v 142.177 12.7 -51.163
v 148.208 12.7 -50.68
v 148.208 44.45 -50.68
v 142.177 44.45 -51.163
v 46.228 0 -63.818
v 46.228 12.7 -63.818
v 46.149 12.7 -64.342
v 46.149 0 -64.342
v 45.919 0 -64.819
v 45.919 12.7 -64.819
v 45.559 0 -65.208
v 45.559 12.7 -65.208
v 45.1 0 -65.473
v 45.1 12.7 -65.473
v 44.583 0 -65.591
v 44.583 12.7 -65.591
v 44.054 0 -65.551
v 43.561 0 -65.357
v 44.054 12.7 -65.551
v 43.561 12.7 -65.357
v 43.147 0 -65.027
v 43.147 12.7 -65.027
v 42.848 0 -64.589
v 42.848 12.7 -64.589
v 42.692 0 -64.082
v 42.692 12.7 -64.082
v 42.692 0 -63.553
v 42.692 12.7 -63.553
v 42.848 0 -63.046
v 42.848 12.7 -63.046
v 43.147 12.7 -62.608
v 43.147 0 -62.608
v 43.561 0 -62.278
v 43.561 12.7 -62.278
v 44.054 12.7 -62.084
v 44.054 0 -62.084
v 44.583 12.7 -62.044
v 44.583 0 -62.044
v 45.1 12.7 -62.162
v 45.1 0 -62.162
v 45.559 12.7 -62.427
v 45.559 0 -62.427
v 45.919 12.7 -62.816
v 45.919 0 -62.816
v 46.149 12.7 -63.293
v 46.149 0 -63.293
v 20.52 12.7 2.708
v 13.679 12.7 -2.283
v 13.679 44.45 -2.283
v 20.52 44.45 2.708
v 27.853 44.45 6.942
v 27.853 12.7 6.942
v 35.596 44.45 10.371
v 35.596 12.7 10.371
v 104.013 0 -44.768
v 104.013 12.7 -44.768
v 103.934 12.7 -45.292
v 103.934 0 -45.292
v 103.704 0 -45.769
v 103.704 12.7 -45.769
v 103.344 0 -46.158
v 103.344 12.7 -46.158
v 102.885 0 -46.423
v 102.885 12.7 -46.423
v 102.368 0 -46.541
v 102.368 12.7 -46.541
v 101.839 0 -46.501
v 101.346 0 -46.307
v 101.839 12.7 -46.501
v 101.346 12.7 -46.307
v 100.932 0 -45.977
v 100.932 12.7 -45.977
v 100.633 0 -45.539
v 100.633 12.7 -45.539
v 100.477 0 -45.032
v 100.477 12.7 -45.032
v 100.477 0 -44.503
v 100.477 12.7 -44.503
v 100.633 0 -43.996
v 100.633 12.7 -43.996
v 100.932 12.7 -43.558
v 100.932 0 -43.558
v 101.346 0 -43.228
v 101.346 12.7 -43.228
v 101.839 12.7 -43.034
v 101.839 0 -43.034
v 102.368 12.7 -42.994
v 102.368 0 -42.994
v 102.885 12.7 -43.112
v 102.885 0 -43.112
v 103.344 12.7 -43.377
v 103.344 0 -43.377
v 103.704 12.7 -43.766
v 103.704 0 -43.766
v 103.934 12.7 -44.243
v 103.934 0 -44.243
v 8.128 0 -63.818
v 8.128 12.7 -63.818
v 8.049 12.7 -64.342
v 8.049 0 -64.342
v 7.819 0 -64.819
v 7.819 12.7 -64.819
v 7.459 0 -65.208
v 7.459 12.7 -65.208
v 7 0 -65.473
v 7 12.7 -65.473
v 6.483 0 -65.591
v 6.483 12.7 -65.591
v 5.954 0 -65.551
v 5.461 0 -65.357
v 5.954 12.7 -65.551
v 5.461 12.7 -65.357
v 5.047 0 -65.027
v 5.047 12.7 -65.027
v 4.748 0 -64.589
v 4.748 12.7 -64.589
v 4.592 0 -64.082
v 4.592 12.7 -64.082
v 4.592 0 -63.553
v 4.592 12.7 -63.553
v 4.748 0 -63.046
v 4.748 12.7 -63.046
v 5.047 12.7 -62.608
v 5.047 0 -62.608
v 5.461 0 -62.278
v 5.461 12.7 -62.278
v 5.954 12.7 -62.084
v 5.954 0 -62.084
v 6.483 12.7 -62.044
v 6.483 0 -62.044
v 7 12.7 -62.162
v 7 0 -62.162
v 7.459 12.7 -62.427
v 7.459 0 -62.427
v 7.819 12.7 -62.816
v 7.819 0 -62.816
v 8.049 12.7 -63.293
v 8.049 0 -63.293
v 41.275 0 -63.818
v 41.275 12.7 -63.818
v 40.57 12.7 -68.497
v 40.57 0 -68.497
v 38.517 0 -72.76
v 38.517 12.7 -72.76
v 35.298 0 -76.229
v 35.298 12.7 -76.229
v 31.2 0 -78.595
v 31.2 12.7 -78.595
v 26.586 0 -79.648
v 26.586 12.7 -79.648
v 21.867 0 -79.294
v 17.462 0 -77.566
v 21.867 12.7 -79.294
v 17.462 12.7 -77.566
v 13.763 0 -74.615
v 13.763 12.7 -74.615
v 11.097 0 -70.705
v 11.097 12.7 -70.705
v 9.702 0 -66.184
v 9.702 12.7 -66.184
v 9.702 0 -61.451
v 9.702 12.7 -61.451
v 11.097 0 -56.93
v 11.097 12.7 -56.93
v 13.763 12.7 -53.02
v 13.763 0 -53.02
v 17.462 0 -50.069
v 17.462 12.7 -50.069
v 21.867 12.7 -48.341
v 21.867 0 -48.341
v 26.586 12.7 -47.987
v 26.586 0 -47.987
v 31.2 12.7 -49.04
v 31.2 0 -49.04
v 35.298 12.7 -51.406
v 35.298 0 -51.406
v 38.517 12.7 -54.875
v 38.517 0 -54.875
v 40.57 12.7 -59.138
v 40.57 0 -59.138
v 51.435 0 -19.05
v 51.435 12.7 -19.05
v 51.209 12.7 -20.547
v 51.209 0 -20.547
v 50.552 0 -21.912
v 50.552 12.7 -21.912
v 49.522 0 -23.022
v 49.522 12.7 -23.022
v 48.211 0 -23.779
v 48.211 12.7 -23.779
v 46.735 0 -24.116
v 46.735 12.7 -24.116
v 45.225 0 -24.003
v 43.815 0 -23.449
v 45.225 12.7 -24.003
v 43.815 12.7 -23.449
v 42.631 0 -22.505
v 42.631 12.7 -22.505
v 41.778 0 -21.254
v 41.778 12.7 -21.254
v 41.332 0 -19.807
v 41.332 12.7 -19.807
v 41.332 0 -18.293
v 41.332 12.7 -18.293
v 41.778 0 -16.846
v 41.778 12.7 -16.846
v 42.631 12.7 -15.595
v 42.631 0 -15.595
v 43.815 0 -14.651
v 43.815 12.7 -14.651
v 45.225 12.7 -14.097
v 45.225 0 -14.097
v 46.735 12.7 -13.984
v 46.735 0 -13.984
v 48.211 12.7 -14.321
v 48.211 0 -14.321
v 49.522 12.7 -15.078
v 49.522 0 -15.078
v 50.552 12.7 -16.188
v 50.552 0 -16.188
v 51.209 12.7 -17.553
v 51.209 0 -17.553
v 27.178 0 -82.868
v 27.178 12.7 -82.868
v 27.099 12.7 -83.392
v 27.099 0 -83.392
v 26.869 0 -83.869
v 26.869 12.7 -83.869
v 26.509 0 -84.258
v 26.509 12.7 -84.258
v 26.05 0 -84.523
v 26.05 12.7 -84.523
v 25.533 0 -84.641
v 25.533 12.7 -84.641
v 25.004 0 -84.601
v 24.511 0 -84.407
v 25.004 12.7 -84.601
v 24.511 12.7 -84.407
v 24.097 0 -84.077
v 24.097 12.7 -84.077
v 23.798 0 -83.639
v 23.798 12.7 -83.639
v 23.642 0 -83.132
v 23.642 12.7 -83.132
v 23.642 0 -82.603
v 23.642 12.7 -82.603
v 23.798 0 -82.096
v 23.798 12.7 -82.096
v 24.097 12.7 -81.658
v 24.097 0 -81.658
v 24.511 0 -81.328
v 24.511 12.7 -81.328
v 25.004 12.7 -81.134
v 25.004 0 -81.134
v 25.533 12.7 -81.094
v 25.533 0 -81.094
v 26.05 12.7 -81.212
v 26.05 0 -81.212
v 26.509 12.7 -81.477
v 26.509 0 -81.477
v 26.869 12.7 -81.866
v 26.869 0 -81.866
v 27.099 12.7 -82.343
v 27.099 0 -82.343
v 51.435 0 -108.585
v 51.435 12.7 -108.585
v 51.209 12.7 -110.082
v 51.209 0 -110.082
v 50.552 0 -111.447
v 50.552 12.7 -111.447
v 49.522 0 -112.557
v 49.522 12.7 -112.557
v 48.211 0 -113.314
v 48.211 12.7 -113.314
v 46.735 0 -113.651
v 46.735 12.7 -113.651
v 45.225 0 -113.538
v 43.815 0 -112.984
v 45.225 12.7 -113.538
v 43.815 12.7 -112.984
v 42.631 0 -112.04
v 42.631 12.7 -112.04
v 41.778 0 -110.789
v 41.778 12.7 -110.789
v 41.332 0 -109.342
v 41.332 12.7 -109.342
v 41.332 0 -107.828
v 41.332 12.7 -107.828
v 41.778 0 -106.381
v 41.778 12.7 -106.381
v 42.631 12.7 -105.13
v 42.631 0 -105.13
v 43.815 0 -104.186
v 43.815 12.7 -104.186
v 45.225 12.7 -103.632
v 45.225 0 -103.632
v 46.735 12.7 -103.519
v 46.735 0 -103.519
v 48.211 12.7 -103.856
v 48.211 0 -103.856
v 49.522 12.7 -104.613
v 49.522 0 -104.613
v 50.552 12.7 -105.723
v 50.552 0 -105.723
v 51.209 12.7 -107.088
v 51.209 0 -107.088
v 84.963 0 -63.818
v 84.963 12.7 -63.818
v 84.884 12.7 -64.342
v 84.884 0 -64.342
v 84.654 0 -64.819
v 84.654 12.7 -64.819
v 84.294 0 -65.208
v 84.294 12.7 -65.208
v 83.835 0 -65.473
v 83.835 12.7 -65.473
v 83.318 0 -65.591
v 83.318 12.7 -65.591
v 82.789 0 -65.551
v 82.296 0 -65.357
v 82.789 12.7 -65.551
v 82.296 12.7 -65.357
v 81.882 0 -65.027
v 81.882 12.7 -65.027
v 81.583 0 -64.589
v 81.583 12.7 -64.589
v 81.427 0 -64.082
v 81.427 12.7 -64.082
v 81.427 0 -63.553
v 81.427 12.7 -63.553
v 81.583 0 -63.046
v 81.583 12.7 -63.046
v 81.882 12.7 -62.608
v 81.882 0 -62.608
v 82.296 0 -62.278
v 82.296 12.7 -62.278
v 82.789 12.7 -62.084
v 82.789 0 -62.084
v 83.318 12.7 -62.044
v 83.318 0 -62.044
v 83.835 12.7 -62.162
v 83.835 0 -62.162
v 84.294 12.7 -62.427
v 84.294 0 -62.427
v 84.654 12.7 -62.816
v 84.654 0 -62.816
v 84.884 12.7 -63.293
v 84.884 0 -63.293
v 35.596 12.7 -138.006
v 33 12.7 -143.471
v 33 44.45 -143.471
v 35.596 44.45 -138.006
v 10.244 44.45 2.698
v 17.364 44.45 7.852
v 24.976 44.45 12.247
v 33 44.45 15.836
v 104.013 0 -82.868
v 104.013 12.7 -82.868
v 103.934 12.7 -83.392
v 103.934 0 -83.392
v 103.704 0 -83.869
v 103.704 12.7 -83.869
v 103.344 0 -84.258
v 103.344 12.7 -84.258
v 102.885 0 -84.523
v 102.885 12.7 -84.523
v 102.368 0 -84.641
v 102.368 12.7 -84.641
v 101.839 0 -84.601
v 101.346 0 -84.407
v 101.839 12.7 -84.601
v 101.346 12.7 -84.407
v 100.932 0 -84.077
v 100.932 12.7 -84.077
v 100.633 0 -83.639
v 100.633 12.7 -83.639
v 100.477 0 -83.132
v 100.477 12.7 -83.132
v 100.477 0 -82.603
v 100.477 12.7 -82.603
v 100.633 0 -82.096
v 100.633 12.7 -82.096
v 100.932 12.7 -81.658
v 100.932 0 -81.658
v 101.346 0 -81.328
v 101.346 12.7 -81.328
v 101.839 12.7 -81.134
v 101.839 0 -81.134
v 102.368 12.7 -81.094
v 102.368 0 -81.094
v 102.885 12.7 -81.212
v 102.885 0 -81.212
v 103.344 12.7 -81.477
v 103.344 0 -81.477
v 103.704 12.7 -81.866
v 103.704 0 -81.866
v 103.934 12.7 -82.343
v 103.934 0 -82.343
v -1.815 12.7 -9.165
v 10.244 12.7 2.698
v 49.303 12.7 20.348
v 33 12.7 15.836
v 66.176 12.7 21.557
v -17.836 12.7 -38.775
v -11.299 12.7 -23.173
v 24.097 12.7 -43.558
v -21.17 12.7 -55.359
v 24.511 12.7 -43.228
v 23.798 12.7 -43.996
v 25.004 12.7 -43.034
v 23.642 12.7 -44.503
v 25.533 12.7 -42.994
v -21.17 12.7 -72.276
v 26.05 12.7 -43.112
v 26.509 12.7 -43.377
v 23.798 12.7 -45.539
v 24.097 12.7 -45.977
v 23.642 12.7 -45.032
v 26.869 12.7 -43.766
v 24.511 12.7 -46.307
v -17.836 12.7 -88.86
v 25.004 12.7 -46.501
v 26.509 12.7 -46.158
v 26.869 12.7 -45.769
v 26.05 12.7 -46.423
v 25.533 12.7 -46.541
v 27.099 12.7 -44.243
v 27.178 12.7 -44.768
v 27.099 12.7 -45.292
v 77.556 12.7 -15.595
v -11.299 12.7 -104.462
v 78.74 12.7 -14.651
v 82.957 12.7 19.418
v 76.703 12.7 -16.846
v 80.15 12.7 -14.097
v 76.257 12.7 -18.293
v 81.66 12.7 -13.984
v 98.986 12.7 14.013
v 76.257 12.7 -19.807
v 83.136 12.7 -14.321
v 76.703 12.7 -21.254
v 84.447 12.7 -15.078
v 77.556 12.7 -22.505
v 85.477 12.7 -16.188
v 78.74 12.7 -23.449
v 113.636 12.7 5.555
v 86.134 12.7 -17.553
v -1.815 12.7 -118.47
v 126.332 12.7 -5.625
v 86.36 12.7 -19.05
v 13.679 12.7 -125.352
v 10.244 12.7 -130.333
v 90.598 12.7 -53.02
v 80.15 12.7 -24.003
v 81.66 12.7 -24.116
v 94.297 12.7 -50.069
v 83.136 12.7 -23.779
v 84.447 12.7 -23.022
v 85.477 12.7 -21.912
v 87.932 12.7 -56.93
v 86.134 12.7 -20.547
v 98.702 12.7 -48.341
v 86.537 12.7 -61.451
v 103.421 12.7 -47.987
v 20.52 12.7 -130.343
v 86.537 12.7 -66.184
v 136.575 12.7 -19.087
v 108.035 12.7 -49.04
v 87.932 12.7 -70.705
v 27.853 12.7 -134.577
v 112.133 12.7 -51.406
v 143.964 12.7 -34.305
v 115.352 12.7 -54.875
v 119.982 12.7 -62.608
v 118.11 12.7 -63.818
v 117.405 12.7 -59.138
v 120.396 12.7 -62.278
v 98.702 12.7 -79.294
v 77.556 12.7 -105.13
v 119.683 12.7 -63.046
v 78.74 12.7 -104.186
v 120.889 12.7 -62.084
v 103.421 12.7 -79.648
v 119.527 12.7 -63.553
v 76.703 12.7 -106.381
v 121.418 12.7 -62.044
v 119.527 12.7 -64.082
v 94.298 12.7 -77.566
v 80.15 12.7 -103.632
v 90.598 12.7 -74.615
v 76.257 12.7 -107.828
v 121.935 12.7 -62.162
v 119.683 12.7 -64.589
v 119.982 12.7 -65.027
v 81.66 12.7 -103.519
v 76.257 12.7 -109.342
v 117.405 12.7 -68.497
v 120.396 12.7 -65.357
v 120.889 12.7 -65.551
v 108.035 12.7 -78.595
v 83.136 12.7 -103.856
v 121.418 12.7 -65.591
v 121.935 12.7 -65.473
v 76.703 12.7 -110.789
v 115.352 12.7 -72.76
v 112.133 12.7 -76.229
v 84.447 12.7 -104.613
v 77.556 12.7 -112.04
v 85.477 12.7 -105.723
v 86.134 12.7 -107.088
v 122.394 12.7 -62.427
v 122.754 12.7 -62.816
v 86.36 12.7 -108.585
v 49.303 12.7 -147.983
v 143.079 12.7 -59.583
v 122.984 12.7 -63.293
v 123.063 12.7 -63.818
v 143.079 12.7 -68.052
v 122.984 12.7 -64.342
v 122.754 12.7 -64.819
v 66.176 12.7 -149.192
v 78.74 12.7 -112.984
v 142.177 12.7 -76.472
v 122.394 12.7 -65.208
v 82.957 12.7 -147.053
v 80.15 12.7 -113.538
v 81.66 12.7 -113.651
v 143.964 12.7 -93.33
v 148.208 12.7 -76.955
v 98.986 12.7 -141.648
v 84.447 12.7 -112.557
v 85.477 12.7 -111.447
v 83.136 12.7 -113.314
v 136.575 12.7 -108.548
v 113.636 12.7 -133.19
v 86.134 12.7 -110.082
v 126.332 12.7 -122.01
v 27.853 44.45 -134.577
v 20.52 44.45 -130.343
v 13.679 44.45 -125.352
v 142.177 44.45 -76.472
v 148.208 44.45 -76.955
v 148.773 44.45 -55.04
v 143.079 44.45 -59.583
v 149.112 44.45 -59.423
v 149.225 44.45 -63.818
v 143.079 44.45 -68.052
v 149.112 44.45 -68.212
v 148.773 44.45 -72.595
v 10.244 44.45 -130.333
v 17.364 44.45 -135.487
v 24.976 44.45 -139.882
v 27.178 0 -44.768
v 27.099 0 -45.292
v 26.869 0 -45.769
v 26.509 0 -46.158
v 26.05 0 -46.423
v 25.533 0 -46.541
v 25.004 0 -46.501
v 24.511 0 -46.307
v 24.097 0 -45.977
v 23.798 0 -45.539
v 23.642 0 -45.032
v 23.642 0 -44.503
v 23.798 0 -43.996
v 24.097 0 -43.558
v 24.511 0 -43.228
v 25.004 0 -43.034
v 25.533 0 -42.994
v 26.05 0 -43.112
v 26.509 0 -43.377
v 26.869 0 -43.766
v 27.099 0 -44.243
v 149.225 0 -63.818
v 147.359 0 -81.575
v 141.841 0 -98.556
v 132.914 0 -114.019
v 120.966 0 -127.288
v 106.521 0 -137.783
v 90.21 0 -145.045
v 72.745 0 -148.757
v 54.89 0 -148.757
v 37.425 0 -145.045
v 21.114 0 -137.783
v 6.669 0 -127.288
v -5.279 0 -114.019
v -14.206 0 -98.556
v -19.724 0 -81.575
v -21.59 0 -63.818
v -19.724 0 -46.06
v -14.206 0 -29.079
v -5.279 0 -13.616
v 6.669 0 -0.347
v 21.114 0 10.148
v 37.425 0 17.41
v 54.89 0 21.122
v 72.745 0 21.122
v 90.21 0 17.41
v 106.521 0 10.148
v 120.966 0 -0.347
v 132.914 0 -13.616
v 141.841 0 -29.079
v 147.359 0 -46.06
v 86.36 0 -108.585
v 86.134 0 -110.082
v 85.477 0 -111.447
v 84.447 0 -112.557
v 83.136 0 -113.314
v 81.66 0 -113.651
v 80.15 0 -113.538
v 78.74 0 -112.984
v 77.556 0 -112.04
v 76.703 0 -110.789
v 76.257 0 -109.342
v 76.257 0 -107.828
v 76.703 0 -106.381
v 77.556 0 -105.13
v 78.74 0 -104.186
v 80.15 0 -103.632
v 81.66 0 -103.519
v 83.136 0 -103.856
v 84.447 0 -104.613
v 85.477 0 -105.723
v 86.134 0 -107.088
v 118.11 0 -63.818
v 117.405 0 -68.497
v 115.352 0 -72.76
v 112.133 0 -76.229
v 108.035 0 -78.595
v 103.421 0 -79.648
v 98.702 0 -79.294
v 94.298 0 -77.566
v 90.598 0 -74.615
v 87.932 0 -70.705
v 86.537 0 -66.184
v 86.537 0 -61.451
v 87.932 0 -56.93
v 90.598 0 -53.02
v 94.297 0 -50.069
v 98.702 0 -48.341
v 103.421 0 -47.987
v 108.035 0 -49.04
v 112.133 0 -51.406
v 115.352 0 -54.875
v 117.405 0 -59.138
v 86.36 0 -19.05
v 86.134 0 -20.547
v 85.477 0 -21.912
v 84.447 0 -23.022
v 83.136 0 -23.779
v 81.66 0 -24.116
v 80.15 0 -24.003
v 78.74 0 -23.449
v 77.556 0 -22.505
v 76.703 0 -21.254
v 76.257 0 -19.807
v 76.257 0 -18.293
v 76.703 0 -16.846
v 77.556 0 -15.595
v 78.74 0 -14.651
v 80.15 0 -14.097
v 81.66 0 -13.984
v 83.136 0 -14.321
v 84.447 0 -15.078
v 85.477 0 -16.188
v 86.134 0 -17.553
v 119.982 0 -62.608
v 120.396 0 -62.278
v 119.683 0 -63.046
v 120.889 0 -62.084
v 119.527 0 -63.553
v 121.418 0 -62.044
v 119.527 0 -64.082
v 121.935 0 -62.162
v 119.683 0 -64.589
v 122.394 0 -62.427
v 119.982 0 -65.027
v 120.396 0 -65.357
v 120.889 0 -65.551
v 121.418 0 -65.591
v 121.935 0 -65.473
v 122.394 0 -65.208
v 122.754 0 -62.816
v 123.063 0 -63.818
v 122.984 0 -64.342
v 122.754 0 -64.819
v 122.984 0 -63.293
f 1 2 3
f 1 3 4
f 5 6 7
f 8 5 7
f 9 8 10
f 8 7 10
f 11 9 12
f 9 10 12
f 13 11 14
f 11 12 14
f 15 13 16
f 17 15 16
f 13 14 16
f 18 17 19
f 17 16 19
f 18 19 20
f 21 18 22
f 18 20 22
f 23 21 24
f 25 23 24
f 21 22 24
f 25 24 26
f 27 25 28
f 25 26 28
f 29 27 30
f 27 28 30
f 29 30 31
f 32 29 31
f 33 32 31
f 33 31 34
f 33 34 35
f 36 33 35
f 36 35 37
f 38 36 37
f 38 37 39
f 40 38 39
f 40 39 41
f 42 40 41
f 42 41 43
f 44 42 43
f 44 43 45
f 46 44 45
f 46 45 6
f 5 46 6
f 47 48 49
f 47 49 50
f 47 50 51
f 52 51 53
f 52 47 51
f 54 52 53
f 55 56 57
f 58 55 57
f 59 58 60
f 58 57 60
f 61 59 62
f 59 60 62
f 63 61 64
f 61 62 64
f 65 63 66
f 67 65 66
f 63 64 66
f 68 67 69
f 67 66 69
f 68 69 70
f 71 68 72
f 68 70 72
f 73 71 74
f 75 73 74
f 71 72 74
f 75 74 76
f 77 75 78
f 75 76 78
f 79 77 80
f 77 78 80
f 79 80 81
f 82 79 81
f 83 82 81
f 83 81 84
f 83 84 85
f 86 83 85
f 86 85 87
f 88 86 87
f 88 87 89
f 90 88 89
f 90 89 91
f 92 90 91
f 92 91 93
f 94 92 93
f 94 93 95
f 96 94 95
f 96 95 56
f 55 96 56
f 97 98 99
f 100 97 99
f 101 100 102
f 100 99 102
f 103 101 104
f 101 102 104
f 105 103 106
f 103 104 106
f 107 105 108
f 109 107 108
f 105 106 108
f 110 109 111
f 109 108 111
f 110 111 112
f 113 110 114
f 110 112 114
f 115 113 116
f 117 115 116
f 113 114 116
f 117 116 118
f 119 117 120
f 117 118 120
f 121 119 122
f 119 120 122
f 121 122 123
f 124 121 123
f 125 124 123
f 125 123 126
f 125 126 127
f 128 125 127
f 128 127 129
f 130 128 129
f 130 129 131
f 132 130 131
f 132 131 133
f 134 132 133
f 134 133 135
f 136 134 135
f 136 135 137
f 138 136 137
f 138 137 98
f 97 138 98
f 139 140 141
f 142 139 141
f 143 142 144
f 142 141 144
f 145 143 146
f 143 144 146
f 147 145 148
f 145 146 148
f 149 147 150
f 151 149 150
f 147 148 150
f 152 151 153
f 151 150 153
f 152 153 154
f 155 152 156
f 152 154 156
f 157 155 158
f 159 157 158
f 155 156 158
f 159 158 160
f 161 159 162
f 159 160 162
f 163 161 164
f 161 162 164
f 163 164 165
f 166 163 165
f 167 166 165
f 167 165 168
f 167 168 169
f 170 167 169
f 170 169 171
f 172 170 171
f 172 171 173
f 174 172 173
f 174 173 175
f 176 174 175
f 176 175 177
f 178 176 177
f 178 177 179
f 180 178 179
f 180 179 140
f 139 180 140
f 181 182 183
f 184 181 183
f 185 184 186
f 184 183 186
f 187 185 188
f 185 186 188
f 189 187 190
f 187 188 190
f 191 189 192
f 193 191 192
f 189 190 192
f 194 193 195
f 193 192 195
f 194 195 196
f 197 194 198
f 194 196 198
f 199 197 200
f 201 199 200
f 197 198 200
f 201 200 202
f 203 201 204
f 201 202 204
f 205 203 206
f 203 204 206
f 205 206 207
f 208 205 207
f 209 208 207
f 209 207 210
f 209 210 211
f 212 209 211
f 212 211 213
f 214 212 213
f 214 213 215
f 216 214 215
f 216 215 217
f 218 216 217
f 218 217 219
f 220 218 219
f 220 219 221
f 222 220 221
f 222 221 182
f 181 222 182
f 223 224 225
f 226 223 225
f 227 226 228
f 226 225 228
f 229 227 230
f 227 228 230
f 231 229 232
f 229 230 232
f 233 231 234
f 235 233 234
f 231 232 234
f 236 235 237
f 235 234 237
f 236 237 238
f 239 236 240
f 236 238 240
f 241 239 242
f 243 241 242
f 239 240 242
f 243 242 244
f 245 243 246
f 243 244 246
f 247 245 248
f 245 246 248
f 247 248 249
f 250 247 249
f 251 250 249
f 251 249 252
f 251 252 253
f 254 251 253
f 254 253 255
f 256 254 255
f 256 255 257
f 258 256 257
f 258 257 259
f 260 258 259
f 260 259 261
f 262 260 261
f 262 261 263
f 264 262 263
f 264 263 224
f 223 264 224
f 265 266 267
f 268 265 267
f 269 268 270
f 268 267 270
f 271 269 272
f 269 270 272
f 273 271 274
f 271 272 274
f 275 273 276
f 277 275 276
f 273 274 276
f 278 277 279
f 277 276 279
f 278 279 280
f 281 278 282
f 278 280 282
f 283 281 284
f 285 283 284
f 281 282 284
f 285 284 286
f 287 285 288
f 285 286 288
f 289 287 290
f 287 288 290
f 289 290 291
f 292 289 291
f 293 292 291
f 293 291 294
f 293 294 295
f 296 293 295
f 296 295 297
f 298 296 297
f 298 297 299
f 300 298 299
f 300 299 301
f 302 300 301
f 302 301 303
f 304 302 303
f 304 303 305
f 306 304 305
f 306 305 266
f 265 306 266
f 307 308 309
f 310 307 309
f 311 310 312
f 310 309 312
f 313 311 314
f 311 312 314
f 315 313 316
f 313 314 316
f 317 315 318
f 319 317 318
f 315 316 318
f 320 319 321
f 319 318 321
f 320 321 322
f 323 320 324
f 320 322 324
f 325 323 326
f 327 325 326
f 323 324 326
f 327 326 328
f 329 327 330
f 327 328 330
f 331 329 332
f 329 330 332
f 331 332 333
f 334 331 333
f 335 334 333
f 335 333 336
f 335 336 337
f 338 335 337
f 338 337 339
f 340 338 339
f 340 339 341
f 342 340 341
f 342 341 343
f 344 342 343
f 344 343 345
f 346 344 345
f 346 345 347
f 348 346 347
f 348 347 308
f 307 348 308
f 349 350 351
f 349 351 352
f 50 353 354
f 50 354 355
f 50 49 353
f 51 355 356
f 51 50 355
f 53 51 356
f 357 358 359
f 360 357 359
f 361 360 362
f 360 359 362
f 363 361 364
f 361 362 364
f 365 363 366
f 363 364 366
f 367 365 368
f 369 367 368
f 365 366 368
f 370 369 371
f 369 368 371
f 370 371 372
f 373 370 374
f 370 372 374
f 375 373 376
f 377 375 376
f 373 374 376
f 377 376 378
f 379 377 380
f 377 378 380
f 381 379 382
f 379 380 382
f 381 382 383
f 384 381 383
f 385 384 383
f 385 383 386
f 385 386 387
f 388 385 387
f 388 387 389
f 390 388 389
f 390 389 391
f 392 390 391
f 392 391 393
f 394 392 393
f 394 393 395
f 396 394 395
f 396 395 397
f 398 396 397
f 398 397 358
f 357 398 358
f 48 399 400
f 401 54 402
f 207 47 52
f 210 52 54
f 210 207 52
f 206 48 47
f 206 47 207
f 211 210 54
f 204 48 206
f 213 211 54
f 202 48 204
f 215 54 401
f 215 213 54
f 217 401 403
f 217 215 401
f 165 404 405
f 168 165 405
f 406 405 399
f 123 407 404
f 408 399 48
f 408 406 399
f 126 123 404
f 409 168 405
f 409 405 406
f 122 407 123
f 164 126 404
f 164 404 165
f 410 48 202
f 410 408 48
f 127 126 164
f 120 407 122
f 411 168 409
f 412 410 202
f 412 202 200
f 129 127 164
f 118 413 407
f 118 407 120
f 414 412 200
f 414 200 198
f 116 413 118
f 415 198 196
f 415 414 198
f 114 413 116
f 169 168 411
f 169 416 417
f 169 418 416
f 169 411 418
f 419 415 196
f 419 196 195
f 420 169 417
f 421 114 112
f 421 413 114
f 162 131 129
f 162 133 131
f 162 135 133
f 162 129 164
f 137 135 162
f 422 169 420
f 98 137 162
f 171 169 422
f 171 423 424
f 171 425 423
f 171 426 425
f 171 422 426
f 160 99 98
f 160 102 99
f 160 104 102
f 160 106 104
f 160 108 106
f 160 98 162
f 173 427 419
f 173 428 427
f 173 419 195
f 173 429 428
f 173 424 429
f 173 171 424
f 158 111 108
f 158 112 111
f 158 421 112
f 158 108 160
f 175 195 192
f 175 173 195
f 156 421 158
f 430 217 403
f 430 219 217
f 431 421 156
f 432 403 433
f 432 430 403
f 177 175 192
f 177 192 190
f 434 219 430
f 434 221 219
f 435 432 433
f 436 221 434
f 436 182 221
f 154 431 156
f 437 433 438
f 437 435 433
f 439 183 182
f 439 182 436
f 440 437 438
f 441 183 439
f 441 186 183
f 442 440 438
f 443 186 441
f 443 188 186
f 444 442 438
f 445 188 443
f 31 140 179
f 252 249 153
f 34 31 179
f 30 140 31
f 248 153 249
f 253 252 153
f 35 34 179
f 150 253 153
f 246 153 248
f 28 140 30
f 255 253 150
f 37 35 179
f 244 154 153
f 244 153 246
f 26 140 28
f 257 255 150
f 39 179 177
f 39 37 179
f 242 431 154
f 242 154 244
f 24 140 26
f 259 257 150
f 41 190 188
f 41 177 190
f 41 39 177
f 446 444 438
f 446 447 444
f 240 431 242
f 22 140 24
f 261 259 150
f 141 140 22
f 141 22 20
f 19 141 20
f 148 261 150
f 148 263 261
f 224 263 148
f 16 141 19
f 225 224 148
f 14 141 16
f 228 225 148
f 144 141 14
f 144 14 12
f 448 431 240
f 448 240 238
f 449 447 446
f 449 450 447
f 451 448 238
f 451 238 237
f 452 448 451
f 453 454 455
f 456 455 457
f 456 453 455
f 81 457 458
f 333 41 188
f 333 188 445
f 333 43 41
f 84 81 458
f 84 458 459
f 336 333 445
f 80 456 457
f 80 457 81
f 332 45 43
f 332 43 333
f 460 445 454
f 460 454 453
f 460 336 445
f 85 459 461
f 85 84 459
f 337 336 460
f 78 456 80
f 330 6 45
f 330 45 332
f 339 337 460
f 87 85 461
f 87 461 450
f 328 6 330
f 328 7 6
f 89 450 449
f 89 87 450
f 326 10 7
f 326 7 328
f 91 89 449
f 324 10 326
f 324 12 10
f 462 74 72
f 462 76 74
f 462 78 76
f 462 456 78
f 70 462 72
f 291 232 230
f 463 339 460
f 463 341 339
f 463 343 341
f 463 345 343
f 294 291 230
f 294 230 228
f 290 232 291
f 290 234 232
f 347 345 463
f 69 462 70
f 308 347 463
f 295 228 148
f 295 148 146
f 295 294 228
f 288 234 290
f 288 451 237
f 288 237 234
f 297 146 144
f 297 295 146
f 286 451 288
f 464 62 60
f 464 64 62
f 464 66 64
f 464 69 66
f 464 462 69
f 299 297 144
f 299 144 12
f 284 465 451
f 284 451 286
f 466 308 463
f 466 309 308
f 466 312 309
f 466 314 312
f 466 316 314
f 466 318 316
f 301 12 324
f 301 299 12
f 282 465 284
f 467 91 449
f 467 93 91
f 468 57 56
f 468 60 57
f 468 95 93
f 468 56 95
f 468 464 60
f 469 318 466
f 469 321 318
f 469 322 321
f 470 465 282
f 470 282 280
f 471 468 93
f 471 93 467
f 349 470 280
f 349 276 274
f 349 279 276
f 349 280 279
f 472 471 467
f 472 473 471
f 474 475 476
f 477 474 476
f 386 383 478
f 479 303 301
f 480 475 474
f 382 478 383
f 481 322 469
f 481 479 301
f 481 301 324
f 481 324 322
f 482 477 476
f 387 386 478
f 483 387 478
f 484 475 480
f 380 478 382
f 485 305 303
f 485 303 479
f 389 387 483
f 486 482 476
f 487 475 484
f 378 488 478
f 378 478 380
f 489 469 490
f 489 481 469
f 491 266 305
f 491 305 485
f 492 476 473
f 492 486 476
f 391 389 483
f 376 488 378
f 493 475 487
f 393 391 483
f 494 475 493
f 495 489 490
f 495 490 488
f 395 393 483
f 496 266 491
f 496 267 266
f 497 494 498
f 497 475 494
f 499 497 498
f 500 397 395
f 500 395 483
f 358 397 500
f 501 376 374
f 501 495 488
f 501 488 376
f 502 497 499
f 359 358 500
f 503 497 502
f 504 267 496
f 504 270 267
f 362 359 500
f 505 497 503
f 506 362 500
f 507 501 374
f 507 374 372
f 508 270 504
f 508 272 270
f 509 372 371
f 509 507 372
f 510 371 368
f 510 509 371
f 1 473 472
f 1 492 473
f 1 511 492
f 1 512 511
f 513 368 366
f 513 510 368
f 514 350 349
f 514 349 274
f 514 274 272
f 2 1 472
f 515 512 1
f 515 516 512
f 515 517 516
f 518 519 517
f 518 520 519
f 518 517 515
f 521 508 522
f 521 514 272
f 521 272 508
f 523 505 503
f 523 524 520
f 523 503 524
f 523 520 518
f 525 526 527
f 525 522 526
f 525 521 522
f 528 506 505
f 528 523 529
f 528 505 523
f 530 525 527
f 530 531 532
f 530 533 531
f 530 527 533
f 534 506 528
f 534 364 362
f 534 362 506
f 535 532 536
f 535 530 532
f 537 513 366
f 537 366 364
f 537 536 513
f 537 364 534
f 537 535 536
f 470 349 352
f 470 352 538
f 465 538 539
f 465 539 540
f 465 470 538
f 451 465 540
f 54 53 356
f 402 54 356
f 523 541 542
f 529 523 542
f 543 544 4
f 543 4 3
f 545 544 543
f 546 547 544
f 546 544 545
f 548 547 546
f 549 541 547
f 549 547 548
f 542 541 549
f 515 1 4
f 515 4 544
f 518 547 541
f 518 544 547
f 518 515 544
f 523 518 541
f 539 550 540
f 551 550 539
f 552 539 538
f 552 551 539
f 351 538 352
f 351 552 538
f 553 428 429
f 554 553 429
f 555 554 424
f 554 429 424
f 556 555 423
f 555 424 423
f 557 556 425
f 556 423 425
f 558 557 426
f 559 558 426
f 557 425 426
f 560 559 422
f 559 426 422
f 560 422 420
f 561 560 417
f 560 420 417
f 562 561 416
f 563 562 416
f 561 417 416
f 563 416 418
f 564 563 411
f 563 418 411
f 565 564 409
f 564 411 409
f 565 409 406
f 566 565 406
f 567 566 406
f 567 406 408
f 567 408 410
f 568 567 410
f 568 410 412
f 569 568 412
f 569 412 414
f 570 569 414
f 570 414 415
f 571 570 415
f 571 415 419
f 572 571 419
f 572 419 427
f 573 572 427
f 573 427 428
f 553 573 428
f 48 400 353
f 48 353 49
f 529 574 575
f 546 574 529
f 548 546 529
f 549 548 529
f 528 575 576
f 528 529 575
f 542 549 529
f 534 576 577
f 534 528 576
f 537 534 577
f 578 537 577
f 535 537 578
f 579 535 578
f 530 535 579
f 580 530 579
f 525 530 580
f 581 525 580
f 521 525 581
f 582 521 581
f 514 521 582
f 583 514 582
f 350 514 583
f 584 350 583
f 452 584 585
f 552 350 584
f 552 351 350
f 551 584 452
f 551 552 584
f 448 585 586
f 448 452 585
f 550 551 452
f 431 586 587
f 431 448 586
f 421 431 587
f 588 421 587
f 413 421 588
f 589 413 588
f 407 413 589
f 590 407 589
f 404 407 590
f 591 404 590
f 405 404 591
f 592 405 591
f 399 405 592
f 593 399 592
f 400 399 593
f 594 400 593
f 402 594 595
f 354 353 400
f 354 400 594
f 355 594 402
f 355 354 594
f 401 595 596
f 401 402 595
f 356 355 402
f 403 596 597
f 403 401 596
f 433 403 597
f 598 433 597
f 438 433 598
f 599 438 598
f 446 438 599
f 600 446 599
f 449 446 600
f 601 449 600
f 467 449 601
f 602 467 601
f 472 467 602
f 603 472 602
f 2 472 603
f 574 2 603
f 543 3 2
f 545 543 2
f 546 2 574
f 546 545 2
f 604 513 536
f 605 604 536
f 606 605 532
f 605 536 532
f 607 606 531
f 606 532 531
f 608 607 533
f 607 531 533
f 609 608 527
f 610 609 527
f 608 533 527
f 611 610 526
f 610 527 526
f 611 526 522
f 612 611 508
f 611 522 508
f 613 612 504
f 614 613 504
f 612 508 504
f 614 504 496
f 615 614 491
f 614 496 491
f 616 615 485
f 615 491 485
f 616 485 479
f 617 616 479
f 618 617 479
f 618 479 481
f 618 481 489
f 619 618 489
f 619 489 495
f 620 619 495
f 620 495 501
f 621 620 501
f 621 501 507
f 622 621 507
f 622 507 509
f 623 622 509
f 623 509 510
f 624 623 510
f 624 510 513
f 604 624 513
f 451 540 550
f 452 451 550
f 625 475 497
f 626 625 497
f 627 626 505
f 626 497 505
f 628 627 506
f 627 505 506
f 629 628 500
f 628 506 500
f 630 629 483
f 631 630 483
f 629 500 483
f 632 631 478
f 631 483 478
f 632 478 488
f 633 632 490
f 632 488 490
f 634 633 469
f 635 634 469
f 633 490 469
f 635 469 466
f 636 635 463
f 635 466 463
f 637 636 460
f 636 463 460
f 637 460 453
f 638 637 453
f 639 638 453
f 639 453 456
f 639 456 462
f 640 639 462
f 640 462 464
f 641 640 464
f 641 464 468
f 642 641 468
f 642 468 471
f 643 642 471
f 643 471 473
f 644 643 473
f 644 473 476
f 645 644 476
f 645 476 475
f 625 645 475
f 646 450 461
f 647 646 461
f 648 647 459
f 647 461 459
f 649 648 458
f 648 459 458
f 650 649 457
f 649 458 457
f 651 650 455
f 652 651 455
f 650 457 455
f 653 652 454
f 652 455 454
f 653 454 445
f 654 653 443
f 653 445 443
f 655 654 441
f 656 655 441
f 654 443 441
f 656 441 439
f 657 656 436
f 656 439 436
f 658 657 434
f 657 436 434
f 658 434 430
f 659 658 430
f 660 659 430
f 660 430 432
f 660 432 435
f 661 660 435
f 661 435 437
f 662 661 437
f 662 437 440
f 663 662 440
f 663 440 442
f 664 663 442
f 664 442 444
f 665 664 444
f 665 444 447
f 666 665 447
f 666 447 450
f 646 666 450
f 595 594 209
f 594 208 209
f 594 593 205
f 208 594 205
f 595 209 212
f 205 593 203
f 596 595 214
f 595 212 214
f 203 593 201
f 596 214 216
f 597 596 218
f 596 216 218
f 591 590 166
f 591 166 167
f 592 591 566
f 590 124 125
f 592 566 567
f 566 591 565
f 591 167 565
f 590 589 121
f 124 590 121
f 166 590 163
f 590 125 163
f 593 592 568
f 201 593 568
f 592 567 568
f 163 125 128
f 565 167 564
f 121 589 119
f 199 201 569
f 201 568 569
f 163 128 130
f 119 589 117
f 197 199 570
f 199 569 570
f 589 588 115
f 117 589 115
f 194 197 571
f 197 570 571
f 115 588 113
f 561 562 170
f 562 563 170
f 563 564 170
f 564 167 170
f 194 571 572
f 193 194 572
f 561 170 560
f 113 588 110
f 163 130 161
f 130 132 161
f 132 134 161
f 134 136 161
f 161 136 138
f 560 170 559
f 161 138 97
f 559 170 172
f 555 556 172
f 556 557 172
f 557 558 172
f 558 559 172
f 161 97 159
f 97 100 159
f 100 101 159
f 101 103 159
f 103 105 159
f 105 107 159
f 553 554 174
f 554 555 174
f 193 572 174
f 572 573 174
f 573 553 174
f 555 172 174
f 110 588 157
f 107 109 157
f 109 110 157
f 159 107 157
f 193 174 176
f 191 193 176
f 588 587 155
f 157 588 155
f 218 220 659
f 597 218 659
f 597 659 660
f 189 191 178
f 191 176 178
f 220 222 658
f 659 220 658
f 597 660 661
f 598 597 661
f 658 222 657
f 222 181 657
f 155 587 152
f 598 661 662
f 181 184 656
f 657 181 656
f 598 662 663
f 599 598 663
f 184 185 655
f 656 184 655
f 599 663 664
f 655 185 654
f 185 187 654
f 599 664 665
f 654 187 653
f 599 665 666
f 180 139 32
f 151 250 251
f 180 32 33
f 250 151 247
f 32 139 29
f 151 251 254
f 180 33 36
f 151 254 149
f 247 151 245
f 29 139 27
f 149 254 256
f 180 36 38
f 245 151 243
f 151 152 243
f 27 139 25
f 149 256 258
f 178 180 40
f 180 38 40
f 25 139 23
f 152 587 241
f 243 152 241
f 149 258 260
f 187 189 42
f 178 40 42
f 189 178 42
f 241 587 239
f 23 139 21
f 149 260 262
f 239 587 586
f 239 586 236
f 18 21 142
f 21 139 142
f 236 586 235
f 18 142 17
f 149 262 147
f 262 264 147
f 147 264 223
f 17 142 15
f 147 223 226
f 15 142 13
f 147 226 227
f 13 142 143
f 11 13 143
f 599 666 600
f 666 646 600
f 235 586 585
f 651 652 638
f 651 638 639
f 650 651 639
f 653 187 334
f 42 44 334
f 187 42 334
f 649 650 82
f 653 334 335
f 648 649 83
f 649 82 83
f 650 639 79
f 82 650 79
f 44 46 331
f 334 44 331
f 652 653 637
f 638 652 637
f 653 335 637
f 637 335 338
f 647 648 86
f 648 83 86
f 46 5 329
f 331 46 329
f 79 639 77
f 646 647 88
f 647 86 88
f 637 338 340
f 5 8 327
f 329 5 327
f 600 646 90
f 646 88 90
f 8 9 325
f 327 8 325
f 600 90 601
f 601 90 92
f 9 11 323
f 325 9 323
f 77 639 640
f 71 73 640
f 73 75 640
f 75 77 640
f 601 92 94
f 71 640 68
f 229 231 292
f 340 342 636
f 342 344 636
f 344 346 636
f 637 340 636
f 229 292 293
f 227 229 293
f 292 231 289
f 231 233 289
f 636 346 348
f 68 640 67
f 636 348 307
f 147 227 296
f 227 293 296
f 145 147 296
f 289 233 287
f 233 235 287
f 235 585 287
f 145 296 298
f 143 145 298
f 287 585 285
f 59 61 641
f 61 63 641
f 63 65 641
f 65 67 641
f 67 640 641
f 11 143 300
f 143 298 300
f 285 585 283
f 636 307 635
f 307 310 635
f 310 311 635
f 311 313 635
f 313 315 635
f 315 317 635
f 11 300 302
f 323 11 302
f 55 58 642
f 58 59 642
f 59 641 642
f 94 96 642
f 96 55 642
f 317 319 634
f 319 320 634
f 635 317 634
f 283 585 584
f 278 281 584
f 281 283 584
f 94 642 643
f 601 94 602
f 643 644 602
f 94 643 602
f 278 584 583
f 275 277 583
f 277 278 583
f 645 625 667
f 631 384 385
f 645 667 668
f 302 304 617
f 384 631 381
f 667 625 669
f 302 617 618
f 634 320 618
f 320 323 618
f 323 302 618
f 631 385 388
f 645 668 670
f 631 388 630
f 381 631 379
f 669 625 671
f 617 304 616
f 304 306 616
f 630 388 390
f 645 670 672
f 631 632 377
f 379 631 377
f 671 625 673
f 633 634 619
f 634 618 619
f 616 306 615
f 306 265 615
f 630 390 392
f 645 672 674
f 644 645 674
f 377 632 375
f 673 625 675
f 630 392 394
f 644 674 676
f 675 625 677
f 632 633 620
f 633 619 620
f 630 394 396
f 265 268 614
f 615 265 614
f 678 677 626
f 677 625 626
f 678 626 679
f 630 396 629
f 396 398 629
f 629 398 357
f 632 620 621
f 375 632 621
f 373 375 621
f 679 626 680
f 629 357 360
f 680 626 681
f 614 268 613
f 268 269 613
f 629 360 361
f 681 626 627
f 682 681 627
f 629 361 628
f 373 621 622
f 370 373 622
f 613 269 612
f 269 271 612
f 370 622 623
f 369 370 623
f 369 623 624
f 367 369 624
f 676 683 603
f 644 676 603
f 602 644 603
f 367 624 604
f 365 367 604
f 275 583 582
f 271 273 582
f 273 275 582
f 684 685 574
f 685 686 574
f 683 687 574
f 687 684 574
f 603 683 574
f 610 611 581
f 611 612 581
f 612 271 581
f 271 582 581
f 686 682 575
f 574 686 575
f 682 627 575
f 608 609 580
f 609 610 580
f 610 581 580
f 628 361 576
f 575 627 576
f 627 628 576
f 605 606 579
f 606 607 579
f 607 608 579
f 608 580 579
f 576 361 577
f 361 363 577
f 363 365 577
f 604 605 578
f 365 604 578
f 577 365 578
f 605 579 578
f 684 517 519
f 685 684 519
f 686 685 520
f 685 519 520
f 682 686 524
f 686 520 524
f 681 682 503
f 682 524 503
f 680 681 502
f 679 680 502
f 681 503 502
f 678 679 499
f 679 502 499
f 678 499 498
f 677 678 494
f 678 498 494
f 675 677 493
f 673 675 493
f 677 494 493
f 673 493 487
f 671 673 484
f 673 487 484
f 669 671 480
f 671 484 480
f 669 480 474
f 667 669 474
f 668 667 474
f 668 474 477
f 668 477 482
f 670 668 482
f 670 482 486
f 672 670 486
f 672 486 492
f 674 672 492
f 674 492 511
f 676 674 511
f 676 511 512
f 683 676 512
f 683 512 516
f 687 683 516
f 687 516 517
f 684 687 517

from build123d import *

# Parameters (mm, degrees)
SKETCH1_W           = 127.635
SKETCH1_H           = 127.635
MAIN_PLATE_DEPTH    = 12.7
SKETCH9_R           = 85.725
BOSS_EXTRUDE1_DEPTH = 12.7
SKETCH10_R          = 95.25
SKETCH10_R_2        = 85.4075
CUT_EXTRUDE1_DEPTH  = 167.64
SKETCH18_R          = 85.4075
SKETCH18_R_2        = 79.375
BOSS_EXTRUDE2_DEPTH = 38.1
SKETCH21_R          = 15.875
SKETCH21_R_2        = 1.778
CO2_MOUNTS_DEPTH    = 13.7
SKETCH22_R          = 5.08
CUT_EXTRUDE5_DEPTH  = 13.7
SKETCH23_R          = 79.375
CUT_EXTRUDE6_DEPTH  = 111.600000066


with BuildPart() as part:
    # Sketch1 → Main Plate (new body)
    with BuildSketch(Plane(origin=(0, 0, 0), x_dir=(1, 0, 0), z_dir=(0, 1, 0))):
        with Locations((63.8175, 63.8175)):
            Rectangle(SKETCH1_W, SKETCH1_H)
    extrude(amount=MAIN_PLATE_DEPTH)

    # Sketch9 → Boss-Extrude1 (add)
    with BuildSketch(Plane(origin=(0, 12.7, 0), x_dir=(1, 0, 0), z_dir=(0, 1, 0))):
        with Locations((63.8175, 63.8175)):
            Circle(SKETCH9_R)
    extrude(amount=-BOSS_EXTRUDE1_DEPTH)

    # Sketch10 → Cut-Extrude1 (cut)
    with BuildSketch(Plane(origin=(0, 12.7, 0), x_dir=(1, 0, 0), z_dir=(0, 1, 0))):
        with Locations((63.8175, 63.8175)):
            Circle(SKETCH10_R)
        with Locations((63.8175, 63.8175)):
            Circle(SKETCH10_R_2, mode=Mode.SUBTRACT)
    extrude(amount=-CUT_EXTRUDE1_DEPTH, mode=Mode.SUBTRACT)

    # Sketch18 → Boss-Extrude2 (add)
    with BuildSketch(Plane(origin=(0, 6.35, 0), x_dir=(1, 0, 0), z_dir=(0, 1, 0))):
        with Locations((63.8175, 63.8175)):
            Circle(SKETCH18_R)
        with Locations((63.8175, 63.8175)):
            Circle(SKETCH18_R_2, mode=Mode.SUBTRACT)
    extrude(amount=BOSS_EXTRUDE2_DEPTH)

    # Sketch21 → CO2 Mounts (cut, through all)
    with BuildSketch(Plane(origin=(0, 12.7, 0), x_dir=(1, 0, 0), z_dir=(0, 1, 0))):
        with Locations((102.235, 63.8175)):
            Circle(SKETCH21_R)
        with Locations((102.235, 82.8675)):
            Circle(SKETCH21_R_2)
        with Locations((25.4, 63.8175)):
            Circle(SKETCH21_R)
        with Locations((121.285, 63.8175)):
            Circle(SKETCH21_R_2)
        with Locations((102.235, 44.7675)):
            Circle(SKETCH21_R_2)
        with Locations((83.185, 63.8175)):
            Circle(SKETCH21_R_2)
        with Locations((25.4, 82.8675)):
            Circle(SKETCH21_R_2)
        with Locations((6.35, 63.8175)):
            Circle(SKETCH21_R_2)
        with Locations((25.4, 44.7675)):
            Circle(SKETCH21_R_2)
        with Locations((44.45, 63.8175)):
            Circle(SKETCH21_R_2)
    extrude(amount=-CO2_MOUNTS_DEPTH, mode=Mode.SUBTRACT)

    # Sketch22 → Cut-Extrude5 (cut, through all)
    with BuildSketch(Plane(origin=(0, 12.7, 0), x_dir=(1, 0, 0), z_dir=(0, 1, 0))):
        with Locations((46.355, 108.585)):
            Circle(SKETCH22_R)
        with Locations((81.28, 108.585)):
            Circle(SKETCH22_R)
        with Locations((81.28, 19.05)):
            Circle(SKETCH22_R)
        with Locations((46.355, 19.05)):
            Circle(SKETCH22_R)
    extrude(amount=-CUT_EXTRUDE5_DEPTH, mode=Mode.SUBTRACT)

    # Sketch23 → Cut-Extrude6 (cut)
    with BuildSketch(Plane(origin=(0, 12.7, 0), x_dir=(1, 0, 0), z_dir=(0, 1, 0))):
        with Locations((63.8175, 63.8175)):
            Circle(SKETCH23_R)
        with BuildLine():
            Line((13.678739997, 125.352005526), (7.552270878, 134.237860218))
            Line((7.552270878, 134.237860218), (-19.267108419, 125.320629884))
            Line((-19.267108419, 125.320629884), (-48.79695837, 60.397770071))
            Line((-48.79695837, 60.397770071), (-9.884344094, 7.052469015))
            Line((-9.884344094, 7.052469015), (6.959175986, -7.46308736))
            Line((6.959175986, -7.46308736), (13.678739997, 2.282994474))
            ThreePointArc((13.678739997, 2.282994474), (-15.5575, 63.8175), (13.678739997, 125.352005526))
        make_face()
        with BuildLine():
            Line((142.177324996, 76.471687114), (152.935935453, 77.334437661))
            Line((152.935935453, 77.334437661), (158.623077101, 105.019316613))
            Line((158.623077101, 105.019316613), (117.163156193, 163.054346747))
            Line((117.163156193, 163.054346747), (51.508463168, 156.027684783))
            Line((51.508463168, 156.027684783), (30.515862556, 148.698546693))
            Line((30.515862556, 148.698546693), (35.596435007, 138.00619264))
            ThreePointArc((35.596435007, 138.00619264), (103.505, 132.558266425), (142.177324996, 76.471687114))
        make_face()
        with BuildLine():
            Line((35.596435007, -10.37119264), (30.964293669, -20.119797879))
            Line((30.964293669, -20.119797879), (52.096531318, -38.887446496))
            Line((52.096531318, -38.887446496), (123.086302178, -31.999616818))
            Line((123.086302178, -31.999616818), (149.828380926, 28.372346201))
            Line((149.828380926, 28.372346201), (153.977461458, 50.217040667))
            Line((153.977461458, 50.217040667), (142.177324996, 51.163312886))
            ThreePointArc((142.177324996, 51.163312886), (103.505, -4.923266425), (35.596435007, -10.37119264))
        make_face()
    extrude(amount=CUT_EXTRUDE6_DEPTH, mode=Mode.SUBTRACT)


solid = part.part
